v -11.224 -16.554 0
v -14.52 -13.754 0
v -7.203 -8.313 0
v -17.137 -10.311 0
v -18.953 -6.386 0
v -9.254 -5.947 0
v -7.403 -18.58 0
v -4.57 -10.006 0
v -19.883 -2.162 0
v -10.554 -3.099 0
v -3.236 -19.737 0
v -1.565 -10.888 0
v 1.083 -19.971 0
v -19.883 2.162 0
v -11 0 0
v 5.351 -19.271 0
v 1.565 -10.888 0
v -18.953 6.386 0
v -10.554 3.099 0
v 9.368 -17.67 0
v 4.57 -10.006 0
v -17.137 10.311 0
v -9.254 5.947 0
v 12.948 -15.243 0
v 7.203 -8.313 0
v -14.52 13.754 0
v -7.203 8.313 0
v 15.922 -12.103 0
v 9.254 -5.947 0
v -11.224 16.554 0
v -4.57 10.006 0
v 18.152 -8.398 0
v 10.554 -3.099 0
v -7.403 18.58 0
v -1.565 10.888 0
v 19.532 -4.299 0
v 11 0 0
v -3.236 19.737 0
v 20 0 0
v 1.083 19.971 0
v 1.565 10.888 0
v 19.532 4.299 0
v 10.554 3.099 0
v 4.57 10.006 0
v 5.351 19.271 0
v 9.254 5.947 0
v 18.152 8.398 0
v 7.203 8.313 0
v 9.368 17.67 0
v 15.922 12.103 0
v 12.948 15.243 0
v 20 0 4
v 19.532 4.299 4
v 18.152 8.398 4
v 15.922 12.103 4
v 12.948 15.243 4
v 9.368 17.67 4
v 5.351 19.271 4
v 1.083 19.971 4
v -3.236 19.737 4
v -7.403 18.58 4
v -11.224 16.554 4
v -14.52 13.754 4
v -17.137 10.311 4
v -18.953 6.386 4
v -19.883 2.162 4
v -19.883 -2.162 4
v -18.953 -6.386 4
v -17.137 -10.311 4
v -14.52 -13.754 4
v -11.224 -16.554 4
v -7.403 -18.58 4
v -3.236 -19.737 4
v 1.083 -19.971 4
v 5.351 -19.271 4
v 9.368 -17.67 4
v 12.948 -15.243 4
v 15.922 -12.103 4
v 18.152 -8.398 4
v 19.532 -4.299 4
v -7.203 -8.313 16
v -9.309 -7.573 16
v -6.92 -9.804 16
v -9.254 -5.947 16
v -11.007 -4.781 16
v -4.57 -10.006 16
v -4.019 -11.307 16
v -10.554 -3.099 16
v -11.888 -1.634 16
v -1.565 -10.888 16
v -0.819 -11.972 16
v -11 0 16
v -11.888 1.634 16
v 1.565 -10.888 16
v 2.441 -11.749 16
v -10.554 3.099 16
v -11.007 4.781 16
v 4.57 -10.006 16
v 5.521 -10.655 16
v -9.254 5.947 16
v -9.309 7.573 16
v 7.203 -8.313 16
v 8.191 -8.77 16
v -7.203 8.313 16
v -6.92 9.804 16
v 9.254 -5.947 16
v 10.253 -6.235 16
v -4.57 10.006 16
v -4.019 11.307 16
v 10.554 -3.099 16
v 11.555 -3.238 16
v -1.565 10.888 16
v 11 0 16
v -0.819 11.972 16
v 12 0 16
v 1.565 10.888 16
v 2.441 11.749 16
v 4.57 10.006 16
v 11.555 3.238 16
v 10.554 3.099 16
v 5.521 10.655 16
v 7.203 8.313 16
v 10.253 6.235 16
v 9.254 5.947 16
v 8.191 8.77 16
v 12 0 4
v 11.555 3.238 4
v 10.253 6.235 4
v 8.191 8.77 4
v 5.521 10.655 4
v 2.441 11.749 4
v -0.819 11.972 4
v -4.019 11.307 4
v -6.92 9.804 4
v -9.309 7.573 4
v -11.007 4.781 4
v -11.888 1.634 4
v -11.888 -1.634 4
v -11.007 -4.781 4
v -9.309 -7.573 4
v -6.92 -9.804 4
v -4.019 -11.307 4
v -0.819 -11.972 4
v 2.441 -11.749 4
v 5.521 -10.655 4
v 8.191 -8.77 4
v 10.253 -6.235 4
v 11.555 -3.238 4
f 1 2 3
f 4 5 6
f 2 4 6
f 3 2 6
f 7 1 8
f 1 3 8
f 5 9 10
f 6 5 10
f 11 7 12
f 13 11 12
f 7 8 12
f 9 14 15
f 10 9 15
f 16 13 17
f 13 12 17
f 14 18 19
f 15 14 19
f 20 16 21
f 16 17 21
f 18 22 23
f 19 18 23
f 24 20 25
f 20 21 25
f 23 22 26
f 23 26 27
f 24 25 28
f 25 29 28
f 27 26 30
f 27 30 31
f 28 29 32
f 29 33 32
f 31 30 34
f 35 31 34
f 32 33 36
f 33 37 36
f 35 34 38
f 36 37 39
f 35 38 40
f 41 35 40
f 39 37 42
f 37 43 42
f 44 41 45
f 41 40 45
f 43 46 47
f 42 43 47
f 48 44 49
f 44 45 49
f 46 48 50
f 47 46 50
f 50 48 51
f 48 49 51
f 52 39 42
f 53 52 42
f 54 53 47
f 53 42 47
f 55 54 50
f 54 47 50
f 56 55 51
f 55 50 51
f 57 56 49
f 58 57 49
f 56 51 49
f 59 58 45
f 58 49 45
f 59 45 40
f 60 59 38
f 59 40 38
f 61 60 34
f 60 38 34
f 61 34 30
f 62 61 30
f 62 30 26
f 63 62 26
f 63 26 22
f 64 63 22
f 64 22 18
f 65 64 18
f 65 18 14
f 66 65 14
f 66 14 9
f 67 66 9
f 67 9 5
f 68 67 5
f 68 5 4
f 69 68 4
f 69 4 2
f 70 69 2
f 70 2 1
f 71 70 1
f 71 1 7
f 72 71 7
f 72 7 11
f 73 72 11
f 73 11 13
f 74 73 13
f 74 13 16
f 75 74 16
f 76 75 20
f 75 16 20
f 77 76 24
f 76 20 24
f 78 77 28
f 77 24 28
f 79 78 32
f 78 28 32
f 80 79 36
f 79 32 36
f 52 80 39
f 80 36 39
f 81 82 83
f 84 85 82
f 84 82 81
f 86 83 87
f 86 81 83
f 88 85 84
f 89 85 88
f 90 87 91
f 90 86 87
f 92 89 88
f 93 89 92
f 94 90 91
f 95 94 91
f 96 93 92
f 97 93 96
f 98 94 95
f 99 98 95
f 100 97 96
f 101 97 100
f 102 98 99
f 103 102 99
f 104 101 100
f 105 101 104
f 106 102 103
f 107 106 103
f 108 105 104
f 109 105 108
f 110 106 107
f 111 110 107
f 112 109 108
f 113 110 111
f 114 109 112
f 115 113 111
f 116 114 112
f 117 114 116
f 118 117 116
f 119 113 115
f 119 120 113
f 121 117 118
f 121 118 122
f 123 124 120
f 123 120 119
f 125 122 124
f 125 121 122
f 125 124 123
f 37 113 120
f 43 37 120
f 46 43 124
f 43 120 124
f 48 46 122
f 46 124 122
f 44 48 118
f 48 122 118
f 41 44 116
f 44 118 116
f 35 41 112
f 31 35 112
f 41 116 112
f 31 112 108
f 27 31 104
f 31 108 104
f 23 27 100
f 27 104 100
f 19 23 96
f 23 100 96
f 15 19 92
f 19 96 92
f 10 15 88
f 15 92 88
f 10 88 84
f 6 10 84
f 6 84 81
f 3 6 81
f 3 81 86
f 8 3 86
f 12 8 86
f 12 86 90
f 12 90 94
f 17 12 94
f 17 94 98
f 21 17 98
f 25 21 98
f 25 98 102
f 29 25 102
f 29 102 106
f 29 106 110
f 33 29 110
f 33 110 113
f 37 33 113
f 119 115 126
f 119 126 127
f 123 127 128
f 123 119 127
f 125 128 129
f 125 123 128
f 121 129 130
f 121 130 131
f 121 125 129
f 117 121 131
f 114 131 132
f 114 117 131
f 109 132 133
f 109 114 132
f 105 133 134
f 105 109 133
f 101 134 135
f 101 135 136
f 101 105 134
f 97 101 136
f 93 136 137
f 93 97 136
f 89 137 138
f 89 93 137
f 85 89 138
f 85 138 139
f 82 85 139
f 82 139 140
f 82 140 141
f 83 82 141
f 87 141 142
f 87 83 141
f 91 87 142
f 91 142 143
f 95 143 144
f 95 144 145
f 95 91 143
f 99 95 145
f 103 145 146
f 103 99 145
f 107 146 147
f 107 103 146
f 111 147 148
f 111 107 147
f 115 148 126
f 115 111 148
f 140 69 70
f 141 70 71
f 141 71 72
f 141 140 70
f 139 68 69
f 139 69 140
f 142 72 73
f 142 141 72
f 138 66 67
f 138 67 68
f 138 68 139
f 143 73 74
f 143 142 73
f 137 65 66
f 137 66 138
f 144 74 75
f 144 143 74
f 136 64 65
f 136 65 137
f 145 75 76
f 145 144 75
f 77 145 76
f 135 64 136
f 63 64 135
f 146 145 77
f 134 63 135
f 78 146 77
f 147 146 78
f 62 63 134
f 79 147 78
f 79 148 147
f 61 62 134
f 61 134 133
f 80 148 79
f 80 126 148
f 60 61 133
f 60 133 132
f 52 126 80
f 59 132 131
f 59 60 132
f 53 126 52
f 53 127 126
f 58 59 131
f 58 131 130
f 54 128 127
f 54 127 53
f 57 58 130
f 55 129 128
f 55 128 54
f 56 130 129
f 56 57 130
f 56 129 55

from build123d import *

# Parameters (mm, degrees)
ESQUISSE1_R             = 20
BOSS_EXTRU_1_DEPTH      = 16
ESQUISSE2_R             = 20
ESQUISSE2_R_2           = 12
ENL_V_MAT_EXTRU_1_DEPTH = 12
ESQUISSE3_R             = 11
ENL_V_MAT_EXTRU_2_DEPTH = 17


with BuildPart() as part:
    # Esquisse1 → Boss.-Extru.1 (new body)
    with BuildSketch(Plane.XY):
        Circle(ESQUISSE1_R)
    extrude(amount=BOSS_EXTRU_1_DEPTH)

    # Esquisse2 → Enlèv. mat.-Extru.1 (cut)
    with BuildSketch(Plane.XY.offset(16)):
        Circle(ESQUISSE2_R)
        Circle(ESQUISSE2_R_2, mode=Mode.SUBTRACT)
    extrude(amount=-ENL_V_MAT_EXTRU_1_DEPTH, mode=Mode.SUBTRACT)

    # Esquisse3 → Enlèv. mat.-Extru.2 (cut, through all)
    with BuildSketch(Plane.XY.offset(16)):
        Circle(ESQUISSE3_R)
    extrude(amount=-ENL_V_MAT_EXTRU_2_DEPTH, mode=Mode.SUBTRACT)


solid = part.part
